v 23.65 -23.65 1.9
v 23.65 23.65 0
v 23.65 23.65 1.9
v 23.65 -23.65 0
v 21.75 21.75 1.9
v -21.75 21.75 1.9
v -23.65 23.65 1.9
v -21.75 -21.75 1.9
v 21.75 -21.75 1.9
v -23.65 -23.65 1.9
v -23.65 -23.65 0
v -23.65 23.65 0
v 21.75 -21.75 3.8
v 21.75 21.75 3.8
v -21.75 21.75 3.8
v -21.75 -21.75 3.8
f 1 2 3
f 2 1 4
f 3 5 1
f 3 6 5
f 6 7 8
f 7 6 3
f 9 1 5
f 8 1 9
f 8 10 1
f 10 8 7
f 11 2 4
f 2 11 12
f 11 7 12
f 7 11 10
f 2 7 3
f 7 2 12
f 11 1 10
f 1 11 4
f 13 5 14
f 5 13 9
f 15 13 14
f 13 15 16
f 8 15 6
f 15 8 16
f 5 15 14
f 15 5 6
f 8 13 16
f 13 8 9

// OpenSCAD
// file: ../common.scad
module ccube(dims) {
    translate([-dims[0]/2, -dims[1]/2, 0]) cube(dims);
}
// file: measurements.scad
include <../common.scad>

thickness = 1.9;
finger_d = 22;

module holder(h) {
    // Child 0 is the outer shape
    // Child 1 is the inner shape
    // Child 2 is the end-cap hole shape
    // Bottom end
    difference() {
        linear_extrude(thickness) { children(0); }
        translate([0, 0, -1])
            linear_extrude(thickness+2) { children(2); }
    }
    // Main chamber: h + thickness to leave room for the lid.
    translate([0, 0, thickness])
        difference() {
            linear_extrude(h + thickness) { children(0); }
            translate([0, 0, -1])
                linear_extrude(h + thickness + 2) { children(1); }
        }
}

module lid() {
    // Child 0 is the outer shape
    // Child 1 is the inner shape
    // Child 2 is the end-cap hole shape
    // Bottom end
    difference() {
        linear_extrude(thickness) { children(0); }
        translate([0, 0, -1])
            linear_extrude(thickness+2) { children(2); }
    }
    // Cap plug
    translate([0, 0, thickness])
        difference() {
            linear_extrude(thickness) { children(1); }
            translate([0, 0, -1])
                linear_extrude(thickness+2) { children(2); }
        }
}

//
// Discovery Tiles
//

discovery_w = 24;
discovery_count = 21;

function discovery_corner_r(w) = w * 7 / 24;

module discovery_tile_shape(w) {
    r = discovery_corner_r(w);
    translate([-w/2, -w/2]) {
        translate([w-r, w-r])
            circle(r=r, $fn=64);
        square([w-r, w]);
        square([w, w-r]);
    }
}

//
// Ancients
//

ancient_r = 19.5;
ancient_count = 22;

//
// Monotliths/Orbitals
//

monolith_orbital_d = 25.25;
monolith_orbital_count = 22;

//
// Game Tokens
//

sector_w = 90;
sector_r = sector_w / (2 * cos(30));

cube_w = 8.5;

round_d = 15.5;
round_h = 10.1;

//
// Player Kit
//

pop_cube_count = 34;
influence_d = round_d;
influence_h = 5;
influence_count = 16;

//
// Combat Dice
//

die_w = 14.5;
// main file
include <measurements.scad>

ccube([3*die_w+2*thickness, 3*die_w+2*thickness, thickness]);
translate([0, 0, thickness]) ccube([3*die_w, 3*die_w, thickness]);
